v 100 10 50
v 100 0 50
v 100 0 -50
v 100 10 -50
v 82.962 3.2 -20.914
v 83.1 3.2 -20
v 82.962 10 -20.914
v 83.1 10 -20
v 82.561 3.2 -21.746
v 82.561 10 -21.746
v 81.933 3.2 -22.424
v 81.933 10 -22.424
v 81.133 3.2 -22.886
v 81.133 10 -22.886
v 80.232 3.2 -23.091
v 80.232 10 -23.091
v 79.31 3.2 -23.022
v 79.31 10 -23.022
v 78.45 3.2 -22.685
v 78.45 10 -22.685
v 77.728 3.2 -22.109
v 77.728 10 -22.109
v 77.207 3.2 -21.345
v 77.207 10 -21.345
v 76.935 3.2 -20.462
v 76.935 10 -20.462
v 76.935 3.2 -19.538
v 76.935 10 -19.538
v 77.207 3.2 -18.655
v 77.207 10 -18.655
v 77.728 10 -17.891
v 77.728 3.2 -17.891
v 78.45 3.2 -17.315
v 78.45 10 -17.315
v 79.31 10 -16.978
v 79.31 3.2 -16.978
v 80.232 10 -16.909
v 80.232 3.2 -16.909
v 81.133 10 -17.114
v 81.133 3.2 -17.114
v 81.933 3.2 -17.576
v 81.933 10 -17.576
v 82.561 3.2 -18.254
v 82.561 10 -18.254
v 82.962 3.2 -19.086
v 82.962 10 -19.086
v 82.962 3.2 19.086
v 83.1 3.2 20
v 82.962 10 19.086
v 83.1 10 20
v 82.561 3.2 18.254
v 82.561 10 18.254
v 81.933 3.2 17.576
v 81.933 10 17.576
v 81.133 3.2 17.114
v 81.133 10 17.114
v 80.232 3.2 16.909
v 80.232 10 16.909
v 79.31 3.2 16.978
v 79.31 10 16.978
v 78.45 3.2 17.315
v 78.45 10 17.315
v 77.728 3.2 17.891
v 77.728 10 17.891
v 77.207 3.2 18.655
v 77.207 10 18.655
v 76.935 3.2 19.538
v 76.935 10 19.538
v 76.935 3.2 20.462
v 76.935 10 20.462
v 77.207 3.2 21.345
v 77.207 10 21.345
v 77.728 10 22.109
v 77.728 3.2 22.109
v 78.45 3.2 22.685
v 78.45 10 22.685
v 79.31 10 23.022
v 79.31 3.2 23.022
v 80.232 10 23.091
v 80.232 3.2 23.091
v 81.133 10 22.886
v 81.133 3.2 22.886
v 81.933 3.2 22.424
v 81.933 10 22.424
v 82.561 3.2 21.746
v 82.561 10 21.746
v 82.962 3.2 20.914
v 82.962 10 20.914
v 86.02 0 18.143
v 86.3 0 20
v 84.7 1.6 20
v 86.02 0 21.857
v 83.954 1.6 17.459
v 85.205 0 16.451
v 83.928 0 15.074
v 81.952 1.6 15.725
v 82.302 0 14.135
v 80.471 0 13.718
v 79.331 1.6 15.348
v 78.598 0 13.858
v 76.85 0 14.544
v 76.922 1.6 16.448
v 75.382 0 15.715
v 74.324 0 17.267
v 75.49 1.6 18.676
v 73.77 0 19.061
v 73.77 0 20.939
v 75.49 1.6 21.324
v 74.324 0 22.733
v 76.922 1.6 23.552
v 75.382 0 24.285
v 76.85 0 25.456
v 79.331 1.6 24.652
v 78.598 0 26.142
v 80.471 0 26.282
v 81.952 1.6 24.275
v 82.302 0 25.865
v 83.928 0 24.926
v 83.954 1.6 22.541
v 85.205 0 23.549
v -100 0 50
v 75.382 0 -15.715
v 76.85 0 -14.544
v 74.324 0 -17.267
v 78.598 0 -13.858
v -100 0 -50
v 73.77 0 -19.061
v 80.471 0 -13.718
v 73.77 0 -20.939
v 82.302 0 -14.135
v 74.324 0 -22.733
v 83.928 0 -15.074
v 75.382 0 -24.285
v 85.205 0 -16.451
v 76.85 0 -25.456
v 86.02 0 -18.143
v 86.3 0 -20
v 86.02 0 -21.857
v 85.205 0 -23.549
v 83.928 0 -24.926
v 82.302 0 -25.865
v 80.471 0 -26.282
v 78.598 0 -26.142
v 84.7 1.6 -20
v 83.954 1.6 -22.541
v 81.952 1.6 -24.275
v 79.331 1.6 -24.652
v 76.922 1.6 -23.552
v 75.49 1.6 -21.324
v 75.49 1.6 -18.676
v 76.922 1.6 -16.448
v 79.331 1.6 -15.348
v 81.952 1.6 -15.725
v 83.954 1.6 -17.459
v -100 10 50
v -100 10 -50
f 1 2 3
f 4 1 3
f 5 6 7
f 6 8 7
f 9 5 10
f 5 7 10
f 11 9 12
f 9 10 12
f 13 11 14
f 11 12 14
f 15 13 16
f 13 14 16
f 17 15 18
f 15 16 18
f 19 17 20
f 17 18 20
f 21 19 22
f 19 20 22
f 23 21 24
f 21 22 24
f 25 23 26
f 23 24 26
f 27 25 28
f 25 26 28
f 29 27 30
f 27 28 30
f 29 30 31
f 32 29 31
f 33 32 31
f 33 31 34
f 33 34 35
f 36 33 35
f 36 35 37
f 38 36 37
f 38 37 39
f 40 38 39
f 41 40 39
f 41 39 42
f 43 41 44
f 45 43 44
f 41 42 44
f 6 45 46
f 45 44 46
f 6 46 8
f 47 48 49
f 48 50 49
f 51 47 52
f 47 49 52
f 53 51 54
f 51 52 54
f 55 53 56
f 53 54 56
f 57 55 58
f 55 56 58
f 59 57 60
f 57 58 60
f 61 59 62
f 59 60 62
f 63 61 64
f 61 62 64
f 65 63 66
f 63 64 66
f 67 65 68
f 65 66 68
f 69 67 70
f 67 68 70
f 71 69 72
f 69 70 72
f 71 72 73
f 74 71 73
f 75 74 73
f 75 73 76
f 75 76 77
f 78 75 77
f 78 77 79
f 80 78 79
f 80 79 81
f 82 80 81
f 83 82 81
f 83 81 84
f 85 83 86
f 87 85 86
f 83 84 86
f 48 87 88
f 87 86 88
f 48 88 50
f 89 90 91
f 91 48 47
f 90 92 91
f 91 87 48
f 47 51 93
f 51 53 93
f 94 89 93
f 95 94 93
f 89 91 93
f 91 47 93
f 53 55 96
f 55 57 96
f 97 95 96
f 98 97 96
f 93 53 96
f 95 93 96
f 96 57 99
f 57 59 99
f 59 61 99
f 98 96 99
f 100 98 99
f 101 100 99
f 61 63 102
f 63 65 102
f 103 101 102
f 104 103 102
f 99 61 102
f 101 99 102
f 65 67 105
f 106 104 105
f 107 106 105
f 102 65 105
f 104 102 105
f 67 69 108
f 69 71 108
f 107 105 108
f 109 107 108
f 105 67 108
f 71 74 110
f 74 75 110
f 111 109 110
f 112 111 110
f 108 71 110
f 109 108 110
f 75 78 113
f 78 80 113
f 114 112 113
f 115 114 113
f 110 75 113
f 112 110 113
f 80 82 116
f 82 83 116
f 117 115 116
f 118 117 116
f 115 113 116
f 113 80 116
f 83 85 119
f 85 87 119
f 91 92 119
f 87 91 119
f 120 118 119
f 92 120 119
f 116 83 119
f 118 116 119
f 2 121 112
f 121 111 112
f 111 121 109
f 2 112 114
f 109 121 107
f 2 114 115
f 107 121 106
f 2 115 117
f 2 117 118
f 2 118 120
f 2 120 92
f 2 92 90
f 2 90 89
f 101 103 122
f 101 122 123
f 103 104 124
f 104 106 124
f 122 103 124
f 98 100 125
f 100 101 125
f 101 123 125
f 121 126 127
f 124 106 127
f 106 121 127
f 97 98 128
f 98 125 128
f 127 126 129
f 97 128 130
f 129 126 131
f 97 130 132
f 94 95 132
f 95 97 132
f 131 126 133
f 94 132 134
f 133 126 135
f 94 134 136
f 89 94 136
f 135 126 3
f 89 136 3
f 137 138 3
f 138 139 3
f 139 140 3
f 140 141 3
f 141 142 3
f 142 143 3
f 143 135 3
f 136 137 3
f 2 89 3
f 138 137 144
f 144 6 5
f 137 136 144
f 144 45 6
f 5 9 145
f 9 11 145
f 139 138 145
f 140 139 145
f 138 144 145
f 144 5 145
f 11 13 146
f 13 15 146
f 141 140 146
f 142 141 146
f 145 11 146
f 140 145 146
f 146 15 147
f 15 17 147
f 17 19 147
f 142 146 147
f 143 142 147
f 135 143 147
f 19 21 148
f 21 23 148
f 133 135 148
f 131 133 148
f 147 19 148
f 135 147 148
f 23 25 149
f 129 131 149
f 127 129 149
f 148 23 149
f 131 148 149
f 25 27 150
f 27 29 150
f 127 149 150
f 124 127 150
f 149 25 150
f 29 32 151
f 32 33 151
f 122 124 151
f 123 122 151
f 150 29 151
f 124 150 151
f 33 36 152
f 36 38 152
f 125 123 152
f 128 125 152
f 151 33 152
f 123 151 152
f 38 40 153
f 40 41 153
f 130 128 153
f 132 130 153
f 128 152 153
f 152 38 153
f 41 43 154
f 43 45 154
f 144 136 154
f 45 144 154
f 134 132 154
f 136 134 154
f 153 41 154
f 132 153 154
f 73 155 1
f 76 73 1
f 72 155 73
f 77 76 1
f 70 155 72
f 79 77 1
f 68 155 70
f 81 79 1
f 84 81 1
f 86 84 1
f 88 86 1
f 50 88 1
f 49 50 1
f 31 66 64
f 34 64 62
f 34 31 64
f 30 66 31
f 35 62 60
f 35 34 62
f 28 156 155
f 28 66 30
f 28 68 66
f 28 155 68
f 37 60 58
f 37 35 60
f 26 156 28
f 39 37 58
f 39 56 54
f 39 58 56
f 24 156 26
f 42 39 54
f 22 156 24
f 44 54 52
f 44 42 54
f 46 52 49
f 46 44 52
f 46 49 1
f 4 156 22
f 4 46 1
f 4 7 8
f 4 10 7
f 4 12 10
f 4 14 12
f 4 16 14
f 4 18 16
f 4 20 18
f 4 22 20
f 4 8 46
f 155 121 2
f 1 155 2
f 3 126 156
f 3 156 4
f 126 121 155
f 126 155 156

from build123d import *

# Parameters (mm, degrees)
ESQUISSE1_W                                    = 200
ESQUISSE1_H                                    = 100
BOSS_EXTRU_1_DEPTH                             = 10
FRAISAGE_POUR_VIS_T_TE_FRAIS_E_M61_D           = 6.2
FRAISAGE_POUR_VIS_T_TE_FRAIS_E_M61_CSINK_D     = 12.6
FRAISAGE_POUR_VIS_T_TE_FRAIS_E_M61_CSINK_ANGLE = 90


with BuildPart() as part:
    # Esquisse1 → Boss.-Extru.1 (new body)
    with BuildSketch(Plane(origin=(0, 0, 0), x_dir=(1, 0, 0), z_dir=(0, 1, 0))):
        Rectangle(ESQUISSE1_W, ESQUISSE1_H)
    extrude(amount=BOSS_EXTRU_1_DEPTH)

    # Fraisage pour vis à tête fraisée M61 (through all)
    with Locations(Plane(origin=(0, 0, 0), x_dir=(-1, 0, 0), z_dir=(0, -1, 0))):
        with Locations((-80, 20), (-80, -20)):
            CounterSinkHole(FRAISAGE_POUR_VIS_T_TE_FRAIS_E_M61_D / 2, FRAISAGE_POUR_VIS_T_TE_FRAIS_E_M61_CSINK_D / 2, counter_sink_angle=FRAISAGE_POUR_VIS_T_TE_FRAIS_E_M61_CSINK_ANGLE)


solid = part.part
